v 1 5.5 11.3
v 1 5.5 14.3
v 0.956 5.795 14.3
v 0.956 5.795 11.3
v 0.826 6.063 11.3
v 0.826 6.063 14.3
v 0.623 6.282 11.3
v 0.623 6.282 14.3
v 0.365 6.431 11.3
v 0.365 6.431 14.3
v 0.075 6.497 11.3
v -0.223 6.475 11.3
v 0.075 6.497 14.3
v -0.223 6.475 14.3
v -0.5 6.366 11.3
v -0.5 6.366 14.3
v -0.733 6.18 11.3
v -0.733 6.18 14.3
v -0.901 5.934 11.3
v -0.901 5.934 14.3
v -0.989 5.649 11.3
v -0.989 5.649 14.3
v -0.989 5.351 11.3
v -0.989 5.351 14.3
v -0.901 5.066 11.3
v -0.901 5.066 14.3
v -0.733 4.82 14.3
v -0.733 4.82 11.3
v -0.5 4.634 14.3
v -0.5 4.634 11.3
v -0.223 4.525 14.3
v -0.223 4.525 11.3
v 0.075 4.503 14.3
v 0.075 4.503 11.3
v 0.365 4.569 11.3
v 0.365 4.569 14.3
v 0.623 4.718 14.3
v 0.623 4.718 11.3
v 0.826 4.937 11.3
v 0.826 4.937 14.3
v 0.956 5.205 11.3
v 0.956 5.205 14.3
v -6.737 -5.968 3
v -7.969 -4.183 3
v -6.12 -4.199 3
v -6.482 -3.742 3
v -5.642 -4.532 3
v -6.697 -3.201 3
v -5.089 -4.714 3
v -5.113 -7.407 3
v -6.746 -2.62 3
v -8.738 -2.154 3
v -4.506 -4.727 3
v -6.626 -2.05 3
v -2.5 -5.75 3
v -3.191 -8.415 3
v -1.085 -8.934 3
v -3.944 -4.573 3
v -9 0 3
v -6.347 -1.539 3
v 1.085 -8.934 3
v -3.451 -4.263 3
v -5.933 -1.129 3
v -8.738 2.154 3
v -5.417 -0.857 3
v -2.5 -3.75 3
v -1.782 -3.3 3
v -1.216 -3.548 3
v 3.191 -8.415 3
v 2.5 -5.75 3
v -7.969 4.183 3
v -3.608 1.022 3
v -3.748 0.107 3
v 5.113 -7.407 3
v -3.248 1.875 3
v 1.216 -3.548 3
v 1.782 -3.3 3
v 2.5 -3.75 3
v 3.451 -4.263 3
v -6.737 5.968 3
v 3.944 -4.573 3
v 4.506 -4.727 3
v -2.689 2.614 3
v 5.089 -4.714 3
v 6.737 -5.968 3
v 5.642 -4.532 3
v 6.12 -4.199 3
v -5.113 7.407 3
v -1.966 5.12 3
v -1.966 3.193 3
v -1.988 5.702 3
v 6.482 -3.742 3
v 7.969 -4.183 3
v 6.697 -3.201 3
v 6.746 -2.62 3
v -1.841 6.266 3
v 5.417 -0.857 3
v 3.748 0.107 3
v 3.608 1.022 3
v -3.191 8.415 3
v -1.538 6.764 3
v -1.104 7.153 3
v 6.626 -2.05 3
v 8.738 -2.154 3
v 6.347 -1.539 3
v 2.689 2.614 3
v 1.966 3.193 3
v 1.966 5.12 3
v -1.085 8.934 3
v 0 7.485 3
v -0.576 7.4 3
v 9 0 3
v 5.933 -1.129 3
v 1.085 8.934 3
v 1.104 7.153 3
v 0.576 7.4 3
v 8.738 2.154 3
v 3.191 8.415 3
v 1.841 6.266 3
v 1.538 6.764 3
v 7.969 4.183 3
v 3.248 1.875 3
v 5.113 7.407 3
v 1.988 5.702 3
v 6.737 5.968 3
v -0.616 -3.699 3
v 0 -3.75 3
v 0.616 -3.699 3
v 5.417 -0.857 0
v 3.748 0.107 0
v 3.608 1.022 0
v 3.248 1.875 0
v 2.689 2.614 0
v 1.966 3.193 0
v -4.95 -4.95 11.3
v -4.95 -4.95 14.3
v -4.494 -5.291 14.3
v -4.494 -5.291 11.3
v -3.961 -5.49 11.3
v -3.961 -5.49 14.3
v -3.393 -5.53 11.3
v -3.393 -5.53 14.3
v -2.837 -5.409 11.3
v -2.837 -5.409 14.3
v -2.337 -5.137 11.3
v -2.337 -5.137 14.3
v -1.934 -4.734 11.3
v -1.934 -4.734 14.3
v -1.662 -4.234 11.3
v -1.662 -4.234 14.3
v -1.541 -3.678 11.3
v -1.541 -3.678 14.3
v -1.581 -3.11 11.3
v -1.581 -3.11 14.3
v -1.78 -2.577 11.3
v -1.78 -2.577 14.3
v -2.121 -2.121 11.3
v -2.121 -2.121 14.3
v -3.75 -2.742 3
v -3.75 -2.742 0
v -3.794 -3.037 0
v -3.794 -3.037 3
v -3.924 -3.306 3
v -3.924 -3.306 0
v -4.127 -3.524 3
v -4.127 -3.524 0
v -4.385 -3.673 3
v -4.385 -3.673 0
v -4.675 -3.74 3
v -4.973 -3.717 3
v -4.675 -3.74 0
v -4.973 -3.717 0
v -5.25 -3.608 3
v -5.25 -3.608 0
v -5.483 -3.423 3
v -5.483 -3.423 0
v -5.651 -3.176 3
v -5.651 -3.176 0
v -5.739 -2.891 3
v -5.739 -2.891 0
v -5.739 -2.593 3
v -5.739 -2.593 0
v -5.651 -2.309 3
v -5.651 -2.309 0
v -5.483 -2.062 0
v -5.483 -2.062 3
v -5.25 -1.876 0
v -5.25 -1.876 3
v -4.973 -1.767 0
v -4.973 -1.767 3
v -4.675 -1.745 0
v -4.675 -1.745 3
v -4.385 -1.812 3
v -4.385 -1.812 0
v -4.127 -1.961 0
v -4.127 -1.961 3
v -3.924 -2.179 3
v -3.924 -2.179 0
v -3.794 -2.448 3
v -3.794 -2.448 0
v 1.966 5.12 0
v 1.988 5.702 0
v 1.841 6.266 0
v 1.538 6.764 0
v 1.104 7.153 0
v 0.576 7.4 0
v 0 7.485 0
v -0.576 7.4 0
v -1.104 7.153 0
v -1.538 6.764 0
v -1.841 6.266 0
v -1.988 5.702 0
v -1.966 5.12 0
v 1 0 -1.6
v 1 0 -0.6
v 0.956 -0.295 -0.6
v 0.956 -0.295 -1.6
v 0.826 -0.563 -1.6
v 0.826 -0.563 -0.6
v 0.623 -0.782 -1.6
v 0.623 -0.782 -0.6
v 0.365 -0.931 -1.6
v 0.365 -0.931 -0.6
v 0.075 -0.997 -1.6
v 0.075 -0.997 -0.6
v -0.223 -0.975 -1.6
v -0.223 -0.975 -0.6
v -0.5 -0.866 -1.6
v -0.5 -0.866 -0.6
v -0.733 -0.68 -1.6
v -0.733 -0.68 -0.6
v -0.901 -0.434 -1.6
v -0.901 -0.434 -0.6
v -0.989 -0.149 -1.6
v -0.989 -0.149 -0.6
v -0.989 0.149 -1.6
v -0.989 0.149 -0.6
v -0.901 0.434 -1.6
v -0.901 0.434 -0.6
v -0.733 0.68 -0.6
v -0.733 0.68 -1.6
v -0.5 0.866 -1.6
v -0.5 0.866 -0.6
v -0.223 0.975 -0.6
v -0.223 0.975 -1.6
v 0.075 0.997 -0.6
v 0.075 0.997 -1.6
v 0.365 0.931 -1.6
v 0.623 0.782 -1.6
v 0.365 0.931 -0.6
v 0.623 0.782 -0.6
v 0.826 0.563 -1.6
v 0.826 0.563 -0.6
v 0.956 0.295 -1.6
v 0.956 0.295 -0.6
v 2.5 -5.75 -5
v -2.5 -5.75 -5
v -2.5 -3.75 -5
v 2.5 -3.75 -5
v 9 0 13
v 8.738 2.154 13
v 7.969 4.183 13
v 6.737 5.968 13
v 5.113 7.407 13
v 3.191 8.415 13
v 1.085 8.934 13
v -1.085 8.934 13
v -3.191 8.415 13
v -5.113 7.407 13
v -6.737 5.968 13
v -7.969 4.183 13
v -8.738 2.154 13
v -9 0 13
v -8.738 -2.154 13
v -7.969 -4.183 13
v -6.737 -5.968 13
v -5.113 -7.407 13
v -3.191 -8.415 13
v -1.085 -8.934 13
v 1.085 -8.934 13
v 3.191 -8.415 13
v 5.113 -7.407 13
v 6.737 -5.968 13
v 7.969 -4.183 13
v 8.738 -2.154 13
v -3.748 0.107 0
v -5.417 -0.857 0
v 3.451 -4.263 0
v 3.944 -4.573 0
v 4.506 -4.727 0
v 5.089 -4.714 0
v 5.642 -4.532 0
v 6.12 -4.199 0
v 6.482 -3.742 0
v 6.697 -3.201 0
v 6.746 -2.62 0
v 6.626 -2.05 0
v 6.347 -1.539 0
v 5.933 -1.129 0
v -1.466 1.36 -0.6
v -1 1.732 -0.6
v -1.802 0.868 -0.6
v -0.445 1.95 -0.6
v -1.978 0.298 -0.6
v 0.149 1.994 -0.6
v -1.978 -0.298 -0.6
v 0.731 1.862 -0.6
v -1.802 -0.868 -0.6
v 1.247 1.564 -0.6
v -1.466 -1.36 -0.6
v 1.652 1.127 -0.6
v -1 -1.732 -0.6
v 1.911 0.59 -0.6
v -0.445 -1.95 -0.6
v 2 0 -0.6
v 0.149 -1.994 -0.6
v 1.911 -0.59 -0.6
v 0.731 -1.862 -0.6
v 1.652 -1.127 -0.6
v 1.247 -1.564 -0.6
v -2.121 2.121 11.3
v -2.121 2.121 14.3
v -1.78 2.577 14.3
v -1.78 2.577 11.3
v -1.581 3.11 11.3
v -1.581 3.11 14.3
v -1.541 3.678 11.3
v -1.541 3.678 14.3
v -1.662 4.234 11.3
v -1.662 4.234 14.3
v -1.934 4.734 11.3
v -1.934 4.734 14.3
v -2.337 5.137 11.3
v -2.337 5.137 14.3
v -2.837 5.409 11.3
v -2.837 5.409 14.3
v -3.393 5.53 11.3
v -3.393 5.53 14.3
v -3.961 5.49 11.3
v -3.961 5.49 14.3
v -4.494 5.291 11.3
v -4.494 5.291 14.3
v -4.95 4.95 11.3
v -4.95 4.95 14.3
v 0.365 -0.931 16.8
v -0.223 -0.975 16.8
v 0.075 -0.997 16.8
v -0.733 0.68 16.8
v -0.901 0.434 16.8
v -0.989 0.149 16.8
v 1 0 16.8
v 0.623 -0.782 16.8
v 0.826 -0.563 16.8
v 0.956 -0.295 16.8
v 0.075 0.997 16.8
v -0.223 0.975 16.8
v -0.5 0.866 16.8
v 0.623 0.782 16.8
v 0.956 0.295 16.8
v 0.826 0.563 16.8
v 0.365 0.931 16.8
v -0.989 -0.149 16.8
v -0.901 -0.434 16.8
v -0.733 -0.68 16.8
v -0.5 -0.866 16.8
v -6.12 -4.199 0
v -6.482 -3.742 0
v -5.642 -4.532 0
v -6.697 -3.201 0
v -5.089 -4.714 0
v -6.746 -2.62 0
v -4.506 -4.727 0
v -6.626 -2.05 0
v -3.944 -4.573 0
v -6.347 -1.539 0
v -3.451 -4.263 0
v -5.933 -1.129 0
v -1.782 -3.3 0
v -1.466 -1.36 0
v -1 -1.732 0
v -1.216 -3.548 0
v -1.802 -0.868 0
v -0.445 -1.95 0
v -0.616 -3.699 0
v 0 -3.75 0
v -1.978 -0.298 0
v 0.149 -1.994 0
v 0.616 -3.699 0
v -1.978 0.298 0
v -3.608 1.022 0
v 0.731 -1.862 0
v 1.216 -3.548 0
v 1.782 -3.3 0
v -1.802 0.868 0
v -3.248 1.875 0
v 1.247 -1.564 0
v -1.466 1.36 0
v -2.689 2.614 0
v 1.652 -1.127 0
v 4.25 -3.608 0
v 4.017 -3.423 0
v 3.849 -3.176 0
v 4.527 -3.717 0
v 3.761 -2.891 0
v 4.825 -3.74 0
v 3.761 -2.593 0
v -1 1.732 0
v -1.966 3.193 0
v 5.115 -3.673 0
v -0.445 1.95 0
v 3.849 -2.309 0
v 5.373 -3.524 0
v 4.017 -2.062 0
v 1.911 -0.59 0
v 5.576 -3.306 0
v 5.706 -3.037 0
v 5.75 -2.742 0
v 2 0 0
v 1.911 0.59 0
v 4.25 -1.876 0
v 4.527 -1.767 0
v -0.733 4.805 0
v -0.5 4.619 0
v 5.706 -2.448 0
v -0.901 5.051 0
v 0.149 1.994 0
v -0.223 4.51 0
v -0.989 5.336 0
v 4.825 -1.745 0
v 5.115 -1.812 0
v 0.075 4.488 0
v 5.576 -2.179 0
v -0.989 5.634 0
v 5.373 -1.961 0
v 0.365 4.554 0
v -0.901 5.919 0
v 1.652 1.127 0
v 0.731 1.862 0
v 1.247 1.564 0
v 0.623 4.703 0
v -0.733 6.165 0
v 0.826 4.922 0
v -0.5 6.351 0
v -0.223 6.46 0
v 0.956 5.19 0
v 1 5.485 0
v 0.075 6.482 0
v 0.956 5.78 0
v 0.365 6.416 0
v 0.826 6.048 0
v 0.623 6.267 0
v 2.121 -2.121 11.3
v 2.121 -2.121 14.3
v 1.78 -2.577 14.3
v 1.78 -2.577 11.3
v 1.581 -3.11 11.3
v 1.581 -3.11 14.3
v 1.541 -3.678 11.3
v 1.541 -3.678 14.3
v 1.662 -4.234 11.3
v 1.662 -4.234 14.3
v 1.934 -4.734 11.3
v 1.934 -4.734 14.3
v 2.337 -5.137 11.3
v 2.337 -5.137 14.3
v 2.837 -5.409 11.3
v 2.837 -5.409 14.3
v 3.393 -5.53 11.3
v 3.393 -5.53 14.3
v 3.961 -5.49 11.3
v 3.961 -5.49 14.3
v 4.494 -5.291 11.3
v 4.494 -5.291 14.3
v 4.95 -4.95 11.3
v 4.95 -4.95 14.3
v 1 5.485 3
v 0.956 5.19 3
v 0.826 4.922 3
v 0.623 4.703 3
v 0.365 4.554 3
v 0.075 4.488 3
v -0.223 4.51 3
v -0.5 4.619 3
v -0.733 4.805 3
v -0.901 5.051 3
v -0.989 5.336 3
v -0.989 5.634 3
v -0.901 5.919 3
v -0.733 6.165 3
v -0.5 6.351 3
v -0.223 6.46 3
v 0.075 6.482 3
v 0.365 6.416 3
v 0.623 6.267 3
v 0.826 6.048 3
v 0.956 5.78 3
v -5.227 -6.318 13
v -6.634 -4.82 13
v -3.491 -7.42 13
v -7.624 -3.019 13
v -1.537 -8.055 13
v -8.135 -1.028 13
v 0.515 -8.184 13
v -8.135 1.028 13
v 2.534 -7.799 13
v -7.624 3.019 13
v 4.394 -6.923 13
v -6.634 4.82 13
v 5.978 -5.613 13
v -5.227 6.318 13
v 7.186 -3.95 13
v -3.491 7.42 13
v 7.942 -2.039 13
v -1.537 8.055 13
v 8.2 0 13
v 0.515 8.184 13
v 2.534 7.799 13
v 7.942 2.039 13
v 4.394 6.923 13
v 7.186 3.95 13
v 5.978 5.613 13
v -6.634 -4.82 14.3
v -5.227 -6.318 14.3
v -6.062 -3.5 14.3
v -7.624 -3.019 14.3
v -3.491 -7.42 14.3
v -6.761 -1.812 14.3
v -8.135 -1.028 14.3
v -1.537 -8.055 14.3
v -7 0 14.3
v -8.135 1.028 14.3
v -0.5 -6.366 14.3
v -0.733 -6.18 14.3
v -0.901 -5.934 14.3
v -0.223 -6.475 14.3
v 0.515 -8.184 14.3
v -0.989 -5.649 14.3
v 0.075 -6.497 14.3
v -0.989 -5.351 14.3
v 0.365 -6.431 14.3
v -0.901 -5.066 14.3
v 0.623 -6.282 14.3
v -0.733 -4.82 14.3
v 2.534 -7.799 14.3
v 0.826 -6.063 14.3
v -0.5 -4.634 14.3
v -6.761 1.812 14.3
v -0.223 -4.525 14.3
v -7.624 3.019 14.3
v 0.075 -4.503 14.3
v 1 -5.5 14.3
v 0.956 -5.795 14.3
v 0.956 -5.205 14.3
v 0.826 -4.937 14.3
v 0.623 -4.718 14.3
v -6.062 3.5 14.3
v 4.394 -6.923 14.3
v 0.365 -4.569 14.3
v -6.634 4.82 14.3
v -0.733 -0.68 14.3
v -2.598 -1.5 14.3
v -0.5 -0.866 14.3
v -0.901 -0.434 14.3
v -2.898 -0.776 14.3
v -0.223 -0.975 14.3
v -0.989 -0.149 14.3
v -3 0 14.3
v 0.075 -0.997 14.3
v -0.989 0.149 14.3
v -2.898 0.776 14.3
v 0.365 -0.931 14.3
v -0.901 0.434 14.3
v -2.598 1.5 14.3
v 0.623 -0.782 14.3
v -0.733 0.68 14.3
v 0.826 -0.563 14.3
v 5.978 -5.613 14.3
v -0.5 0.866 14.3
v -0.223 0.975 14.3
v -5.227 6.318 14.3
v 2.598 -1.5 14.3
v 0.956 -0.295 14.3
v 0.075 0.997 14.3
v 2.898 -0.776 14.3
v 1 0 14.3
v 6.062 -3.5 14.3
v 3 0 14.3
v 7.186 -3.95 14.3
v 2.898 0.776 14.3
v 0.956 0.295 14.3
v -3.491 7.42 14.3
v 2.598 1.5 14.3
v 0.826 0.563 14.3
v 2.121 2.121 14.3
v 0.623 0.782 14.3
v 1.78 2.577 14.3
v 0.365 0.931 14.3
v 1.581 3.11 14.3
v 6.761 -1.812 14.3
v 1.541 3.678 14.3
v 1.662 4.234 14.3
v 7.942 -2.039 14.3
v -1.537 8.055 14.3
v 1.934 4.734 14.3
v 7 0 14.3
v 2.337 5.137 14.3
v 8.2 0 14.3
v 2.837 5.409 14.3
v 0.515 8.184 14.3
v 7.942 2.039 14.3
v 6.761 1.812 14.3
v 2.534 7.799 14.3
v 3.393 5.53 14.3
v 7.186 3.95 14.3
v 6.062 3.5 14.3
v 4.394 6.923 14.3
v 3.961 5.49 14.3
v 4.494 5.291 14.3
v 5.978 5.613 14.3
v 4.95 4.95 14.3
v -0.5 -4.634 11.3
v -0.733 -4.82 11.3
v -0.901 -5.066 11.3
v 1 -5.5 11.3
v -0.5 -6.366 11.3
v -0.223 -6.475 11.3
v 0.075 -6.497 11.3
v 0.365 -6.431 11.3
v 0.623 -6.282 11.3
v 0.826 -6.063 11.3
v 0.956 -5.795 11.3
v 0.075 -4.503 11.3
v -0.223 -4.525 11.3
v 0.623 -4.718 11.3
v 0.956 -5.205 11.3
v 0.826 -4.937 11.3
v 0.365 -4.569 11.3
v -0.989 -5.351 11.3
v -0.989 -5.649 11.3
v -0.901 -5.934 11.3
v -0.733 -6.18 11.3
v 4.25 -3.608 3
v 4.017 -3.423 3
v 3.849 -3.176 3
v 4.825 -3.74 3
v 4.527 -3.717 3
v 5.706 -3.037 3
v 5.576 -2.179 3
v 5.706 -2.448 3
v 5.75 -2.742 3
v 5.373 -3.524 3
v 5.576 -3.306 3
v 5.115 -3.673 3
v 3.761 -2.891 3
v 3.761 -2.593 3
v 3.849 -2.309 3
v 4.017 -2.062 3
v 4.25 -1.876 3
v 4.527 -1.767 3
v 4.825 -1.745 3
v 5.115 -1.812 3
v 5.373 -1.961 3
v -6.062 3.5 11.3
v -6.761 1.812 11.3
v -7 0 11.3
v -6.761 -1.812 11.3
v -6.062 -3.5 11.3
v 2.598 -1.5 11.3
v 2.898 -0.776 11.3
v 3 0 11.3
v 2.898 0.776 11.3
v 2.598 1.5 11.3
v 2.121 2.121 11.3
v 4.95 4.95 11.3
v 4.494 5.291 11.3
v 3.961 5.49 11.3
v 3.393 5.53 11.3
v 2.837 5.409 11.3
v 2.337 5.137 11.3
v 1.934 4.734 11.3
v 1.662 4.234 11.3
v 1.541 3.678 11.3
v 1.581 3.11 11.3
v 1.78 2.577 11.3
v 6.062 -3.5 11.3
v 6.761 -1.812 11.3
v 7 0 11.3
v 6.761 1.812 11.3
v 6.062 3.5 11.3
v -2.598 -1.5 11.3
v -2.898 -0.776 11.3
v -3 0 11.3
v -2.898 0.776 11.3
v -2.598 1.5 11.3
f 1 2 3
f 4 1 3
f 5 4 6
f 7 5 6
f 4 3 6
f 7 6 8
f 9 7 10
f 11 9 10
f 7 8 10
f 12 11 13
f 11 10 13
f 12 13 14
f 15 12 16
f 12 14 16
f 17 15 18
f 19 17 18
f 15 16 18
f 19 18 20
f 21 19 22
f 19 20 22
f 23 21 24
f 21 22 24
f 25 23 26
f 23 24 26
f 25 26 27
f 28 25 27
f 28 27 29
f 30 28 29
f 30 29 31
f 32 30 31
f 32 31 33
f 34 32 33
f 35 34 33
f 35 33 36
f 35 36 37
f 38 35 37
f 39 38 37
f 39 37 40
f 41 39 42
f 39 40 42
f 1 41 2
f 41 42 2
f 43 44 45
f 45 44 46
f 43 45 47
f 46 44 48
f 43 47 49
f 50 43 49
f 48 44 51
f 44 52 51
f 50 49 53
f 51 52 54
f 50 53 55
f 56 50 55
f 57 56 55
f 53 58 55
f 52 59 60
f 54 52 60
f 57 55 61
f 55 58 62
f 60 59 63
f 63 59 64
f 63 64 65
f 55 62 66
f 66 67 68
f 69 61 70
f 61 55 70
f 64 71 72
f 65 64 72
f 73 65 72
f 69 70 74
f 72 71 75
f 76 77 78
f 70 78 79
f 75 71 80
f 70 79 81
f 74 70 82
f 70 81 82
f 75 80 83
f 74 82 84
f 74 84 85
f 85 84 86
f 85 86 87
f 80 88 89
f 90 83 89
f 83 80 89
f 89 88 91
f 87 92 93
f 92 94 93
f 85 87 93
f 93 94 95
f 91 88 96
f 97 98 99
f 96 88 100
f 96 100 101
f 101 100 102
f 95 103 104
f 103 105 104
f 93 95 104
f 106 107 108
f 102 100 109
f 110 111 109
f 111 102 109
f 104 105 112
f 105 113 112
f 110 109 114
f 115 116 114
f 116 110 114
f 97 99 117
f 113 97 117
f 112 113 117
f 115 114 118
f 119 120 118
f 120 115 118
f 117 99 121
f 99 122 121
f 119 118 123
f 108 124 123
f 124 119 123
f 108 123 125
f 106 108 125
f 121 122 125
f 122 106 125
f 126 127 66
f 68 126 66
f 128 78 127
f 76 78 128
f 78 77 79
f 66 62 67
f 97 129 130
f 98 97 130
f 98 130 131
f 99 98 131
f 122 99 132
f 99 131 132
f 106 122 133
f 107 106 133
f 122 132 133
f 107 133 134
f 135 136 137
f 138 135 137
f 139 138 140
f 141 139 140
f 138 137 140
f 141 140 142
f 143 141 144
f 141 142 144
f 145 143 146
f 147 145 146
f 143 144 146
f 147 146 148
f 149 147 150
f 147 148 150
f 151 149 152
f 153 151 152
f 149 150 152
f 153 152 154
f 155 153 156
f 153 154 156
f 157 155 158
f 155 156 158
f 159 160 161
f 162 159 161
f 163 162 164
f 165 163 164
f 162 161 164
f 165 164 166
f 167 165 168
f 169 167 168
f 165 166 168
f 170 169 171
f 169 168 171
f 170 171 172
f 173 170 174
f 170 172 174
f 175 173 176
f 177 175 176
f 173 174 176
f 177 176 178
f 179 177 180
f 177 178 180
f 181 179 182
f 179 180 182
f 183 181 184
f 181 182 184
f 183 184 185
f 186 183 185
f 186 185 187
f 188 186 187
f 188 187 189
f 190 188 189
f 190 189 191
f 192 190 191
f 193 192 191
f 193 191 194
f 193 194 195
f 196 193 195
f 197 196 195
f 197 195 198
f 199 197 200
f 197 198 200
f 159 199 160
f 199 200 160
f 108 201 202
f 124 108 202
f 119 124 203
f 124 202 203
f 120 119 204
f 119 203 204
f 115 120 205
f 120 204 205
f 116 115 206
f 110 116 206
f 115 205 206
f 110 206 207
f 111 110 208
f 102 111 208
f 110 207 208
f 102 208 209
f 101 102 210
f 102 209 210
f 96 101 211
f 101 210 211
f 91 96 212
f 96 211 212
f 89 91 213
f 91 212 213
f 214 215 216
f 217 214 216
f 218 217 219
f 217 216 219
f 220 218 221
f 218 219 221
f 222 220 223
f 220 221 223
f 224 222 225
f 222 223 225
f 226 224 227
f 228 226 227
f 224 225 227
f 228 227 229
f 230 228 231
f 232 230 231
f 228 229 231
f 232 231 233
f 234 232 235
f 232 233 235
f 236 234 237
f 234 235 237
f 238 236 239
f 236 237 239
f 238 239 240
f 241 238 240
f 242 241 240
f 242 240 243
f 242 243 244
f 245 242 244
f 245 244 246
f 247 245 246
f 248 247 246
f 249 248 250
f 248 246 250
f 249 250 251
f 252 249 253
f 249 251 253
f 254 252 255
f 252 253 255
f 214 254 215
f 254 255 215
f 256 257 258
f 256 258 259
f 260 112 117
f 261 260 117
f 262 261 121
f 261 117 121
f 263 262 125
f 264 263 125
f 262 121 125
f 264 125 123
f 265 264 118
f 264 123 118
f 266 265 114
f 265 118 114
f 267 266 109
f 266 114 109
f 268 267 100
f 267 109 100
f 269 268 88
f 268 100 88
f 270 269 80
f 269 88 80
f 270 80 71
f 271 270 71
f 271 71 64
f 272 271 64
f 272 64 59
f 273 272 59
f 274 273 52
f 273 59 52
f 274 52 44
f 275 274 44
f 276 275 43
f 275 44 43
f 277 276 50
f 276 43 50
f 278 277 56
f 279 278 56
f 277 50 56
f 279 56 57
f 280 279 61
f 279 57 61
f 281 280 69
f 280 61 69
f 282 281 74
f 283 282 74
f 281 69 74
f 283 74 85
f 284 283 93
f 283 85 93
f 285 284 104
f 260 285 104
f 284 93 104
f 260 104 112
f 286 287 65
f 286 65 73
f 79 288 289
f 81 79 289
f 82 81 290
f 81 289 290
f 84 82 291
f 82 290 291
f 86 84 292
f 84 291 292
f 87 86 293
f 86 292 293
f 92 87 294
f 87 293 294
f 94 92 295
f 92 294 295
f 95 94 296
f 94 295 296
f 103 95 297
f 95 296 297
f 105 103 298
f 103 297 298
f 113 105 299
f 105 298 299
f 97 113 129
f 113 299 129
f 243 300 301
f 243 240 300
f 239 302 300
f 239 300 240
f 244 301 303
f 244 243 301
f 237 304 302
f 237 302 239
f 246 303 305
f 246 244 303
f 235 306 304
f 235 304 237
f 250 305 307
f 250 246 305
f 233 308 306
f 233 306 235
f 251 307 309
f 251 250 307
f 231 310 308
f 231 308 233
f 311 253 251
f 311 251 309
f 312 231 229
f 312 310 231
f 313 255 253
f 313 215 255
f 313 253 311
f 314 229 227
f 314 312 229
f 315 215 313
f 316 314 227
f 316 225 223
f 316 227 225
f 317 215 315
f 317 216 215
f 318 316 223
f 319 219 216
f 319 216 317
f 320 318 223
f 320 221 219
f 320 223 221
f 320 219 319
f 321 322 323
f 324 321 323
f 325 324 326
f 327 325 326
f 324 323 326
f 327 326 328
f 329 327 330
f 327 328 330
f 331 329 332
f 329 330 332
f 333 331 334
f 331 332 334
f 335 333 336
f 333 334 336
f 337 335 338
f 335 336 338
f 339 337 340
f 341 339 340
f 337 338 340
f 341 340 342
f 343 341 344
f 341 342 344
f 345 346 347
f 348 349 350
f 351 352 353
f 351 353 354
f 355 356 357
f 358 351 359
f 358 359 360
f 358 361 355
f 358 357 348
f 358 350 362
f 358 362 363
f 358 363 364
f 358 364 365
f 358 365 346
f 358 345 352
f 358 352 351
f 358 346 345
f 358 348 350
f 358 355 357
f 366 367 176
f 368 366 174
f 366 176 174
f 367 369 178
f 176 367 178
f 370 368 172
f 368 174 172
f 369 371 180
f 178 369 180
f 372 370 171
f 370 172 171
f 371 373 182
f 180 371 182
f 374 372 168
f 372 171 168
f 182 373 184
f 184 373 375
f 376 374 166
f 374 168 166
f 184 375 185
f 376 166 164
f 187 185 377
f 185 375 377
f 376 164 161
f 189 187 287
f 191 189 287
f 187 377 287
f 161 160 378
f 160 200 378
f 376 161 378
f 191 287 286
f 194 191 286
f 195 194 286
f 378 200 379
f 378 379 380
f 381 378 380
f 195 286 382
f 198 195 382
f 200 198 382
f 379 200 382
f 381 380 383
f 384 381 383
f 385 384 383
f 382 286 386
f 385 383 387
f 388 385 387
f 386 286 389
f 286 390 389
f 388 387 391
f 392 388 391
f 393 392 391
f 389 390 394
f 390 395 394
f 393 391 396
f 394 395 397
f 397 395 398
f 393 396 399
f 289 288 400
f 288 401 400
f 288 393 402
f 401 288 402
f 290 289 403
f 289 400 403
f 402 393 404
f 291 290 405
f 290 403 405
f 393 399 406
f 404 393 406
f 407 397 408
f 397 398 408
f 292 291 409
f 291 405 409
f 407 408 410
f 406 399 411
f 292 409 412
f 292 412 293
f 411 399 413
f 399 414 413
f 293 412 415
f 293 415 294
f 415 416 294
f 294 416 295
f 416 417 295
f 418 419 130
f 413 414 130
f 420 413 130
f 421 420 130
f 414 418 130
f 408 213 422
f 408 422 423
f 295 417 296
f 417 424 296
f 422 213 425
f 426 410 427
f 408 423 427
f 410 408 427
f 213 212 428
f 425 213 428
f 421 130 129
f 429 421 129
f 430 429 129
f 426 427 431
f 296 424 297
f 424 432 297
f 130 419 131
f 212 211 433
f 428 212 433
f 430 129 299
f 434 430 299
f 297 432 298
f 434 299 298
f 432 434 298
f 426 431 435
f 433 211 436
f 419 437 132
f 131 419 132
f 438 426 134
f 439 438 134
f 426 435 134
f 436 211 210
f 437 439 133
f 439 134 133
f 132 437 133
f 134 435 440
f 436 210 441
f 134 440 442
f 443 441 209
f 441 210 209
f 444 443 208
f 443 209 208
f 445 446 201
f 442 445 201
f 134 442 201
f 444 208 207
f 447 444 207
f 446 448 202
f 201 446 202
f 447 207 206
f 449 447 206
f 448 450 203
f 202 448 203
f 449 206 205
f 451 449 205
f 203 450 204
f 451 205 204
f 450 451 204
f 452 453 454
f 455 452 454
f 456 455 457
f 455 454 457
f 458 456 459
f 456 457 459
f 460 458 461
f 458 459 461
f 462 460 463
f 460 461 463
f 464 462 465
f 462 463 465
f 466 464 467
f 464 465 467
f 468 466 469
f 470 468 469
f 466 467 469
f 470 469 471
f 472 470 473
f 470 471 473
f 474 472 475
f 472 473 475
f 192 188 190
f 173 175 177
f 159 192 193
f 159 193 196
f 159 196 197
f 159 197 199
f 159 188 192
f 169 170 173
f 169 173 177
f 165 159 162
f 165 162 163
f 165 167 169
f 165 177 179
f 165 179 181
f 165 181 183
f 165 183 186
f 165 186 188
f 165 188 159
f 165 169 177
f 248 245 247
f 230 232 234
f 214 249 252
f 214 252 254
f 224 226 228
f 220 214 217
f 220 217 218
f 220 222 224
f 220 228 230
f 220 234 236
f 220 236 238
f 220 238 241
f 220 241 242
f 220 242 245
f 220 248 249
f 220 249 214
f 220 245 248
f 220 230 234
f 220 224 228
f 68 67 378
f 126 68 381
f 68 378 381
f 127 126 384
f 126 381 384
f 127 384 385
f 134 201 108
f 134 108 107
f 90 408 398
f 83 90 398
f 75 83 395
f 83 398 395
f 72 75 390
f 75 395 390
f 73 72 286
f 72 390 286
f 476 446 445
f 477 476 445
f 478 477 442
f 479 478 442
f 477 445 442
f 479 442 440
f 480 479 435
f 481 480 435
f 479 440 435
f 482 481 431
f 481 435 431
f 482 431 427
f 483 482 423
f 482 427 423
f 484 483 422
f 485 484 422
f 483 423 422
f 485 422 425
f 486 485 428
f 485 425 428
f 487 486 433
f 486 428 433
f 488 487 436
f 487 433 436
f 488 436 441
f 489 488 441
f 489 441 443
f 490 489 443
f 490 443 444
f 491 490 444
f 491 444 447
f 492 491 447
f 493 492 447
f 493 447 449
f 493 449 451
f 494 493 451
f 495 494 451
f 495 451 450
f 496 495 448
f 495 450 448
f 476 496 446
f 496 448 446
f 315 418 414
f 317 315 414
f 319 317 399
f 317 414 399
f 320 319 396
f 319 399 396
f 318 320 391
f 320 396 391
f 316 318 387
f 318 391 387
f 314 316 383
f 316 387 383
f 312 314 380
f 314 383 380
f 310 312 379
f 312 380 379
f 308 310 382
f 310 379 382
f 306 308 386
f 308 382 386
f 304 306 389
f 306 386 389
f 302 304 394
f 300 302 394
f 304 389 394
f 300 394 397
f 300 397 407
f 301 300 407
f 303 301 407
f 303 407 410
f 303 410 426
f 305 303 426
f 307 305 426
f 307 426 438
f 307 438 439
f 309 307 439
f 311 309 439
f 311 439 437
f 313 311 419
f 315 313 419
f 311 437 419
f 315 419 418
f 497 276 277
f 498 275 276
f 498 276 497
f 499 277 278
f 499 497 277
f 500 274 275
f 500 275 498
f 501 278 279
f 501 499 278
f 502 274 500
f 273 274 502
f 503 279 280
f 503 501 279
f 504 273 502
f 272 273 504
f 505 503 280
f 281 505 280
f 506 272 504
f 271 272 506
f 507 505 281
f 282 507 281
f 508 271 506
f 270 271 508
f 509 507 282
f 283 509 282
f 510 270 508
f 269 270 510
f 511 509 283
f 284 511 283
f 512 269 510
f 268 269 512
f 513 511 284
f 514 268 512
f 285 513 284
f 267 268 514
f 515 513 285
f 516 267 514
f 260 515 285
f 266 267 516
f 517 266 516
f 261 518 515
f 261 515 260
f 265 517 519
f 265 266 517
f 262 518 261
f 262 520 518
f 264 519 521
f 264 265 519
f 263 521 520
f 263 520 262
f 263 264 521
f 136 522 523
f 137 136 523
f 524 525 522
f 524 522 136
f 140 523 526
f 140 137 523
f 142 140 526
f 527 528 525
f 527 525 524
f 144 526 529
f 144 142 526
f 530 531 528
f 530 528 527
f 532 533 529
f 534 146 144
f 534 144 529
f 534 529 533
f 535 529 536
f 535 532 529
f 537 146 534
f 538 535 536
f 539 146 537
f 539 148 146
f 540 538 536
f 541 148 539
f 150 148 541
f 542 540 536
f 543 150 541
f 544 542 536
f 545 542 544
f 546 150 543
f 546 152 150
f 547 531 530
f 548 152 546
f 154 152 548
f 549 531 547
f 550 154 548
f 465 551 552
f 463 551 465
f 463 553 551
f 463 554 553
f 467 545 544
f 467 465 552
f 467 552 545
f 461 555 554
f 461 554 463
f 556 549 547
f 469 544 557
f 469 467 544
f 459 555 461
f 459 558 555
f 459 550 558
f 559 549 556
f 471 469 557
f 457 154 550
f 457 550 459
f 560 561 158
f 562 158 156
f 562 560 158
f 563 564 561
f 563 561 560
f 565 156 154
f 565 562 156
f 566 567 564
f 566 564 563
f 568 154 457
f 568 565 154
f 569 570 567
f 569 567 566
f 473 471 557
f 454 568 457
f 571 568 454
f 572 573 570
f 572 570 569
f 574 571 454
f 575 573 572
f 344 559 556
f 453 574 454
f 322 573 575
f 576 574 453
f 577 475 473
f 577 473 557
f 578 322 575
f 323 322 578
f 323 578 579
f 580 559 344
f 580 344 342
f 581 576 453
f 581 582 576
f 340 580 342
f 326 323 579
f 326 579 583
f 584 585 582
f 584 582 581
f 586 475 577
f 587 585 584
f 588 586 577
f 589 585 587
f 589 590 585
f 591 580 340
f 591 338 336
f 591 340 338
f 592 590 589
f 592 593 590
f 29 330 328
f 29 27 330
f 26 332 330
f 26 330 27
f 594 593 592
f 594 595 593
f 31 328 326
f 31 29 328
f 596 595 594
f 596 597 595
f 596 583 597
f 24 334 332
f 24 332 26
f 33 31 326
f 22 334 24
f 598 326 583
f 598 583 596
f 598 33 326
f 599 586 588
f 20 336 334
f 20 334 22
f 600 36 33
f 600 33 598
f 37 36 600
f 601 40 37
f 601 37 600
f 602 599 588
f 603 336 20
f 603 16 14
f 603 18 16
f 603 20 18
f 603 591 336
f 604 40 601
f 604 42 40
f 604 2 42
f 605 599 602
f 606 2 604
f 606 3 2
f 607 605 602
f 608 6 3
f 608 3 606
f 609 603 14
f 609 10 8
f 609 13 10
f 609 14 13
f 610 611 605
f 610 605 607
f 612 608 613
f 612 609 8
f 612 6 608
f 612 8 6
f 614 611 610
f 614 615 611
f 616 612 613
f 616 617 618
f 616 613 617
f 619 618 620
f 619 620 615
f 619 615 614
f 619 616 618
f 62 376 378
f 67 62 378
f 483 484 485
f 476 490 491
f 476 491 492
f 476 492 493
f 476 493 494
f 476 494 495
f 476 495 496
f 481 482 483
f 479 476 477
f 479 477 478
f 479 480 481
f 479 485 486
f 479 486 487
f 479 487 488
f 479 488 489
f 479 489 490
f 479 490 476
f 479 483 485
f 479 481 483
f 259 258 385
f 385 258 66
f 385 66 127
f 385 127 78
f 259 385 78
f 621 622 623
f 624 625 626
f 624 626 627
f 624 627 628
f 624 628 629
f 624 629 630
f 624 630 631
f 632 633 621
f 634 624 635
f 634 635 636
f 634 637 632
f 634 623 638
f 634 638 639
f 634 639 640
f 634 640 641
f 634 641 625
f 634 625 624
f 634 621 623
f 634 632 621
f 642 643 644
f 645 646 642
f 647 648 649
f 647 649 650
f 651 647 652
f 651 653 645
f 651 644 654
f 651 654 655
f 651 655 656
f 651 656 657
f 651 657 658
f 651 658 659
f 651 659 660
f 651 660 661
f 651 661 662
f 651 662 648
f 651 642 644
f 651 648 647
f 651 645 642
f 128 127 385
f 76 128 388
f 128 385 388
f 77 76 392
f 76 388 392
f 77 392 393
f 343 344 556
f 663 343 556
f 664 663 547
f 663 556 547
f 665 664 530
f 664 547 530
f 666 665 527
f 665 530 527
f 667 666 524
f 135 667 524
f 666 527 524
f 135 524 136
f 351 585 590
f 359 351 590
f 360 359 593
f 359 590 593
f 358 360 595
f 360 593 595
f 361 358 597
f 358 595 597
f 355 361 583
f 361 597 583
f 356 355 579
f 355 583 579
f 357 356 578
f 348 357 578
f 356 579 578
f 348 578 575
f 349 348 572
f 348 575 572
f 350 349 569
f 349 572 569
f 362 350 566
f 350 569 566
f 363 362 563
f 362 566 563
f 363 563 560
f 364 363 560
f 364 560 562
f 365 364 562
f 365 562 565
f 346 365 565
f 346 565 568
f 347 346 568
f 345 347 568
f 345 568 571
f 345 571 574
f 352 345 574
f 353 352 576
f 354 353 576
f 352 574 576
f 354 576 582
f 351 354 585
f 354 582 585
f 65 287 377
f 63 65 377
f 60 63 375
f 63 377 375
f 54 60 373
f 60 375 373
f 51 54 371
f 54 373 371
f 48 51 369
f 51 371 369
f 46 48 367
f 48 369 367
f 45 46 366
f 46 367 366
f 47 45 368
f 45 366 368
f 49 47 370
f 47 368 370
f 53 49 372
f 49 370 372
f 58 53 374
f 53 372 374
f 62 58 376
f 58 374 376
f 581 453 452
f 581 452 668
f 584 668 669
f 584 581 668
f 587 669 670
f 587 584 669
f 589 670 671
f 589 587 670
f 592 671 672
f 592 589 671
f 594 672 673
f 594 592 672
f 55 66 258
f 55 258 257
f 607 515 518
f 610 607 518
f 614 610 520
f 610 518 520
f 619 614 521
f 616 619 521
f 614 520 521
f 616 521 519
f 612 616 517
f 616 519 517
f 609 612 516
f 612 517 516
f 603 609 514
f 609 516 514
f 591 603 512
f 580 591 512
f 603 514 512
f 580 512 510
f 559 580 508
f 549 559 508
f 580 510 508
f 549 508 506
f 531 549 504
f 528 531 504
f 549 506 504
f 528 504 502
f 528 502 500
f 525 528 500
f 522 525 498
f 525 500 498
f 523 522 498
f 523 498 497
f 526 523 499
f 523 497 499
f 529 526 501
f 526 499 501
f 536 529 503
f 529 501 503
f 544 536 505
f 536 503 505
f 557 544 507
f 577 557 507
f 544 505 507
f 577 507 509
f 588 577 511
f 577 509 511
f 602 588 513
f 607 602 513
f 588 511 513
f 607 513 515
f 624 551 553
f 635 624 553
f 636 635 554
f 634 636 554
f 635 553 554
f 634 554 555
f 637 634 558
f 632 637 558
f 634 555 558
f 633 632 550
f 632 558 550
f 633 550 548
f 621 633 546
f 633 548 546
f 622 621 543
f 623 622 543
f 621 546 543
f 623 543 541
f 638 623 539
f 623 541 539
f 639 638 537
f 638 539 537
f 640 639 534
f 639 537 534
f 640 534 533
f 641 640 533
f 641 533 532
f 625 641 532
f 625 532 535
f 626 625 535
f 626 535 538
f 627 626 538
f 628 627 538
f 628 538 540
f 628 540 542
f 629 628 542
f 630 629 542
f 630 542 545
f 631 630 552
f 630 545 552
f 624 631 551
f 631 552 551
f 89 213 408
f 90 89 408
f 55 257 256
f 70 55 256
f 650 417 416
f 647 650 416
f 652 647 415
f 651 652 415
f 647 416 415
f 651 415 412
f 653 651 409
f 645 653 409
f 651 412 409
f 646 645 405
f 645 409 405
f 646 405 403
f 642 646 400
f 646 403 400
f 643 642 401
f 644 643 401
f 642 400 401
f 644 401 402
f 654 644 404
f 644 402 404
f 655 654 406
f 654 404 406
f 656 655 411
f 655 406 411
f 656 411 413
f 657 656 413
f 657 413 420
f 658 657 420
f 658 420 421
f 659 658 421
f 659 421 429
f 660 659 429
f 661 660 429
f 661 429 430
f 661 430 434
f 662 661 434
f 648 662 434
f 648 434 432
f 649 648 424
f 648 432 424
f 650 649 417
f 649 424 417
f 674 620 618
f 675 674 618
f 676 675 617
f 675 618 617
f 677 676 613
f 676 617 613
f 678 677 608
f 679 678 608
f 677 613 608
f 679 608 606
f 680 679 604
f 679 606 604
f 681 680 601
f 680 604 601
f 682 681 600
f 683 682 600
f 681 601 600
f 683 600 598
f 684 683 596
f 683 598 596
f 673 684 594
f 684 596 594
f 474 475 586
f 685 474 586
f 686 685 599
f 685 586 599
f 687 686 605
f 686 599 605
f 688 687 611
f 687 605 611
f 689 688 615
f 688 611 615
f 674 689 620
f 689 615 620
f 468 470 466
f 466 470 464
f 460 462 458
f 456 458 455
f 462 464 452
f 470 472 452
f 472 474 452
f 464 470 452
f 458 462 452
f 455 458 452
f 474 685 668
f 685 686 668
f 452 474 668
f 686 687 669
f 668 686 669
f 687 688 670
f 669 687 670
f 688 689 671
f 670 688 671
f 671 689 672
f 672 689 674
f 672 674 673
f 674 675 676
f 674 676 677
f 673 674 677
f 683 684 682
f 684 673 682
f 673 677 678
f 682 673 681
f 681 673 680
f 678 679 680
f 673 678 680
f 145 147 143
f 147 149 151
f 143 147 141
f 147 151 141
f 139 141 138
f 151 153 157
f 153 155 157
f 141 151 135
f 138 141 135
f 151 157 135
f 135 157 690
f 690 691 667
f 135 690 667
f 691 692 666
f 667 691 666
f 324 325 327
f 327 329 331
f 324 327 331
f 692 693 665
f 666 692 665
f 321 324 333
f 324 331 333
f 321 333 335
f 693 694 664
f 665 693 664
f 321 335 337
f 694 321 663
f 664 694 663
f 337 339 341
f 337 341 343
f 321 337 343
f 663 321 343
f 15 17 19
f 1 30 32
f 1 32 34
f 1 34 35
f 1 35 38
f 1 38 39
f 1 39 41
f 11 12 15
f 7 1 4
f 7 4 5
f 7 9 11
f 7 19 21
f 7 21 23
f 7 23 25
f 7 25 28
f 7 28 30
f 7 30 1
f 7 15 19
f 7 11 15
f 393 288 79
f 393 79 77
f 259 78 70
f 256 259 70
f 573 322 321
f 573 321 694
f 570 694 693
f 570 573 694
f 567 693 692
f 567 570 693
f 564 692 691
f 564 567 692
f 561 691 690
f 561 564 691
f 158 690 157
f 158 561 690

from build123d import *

# Parameters (mm, degrees)
PAD_DEPTH       = 3
SKETCH001_R     = 9
PAD001_DEPTH    = 10
SKETCH002_R     = 8.2
PAD002_DEPTH    = 1.3
SKETCH003_R     = 1
PAD003_DEPTH    = 2.5
SKETCH004_R     = 1
POCKET_DEPTH    = 3
SKETCH005_R     = 1
POCKET001_DEPTH = 3
SKETCH006_R     = 2
PAD004_DEPTH    = 0.6
SKETCH007_R     = 1
PAD005_DEPTH    = 1
SKETCH008_W     = 5
SKETCH008_H     = 2
PAD006_DEPTH    = 8


with BuildPart() as part:
    # Sketch → Pad (new body)
    with BuildSketch(Plane.XY):
        with BuildLine():
            ThreePointArc((3.450971, -4.263113), (6.482051, -3.742414), (5.41745, -0.857073))
            Line((5.41745, -0.857073), (3.748487, 0.106503))
            ThreePointArc((3.748487, 0.106503), (3.247595, 1.875), (1.966478, 3.193034))
            Line((1.966478, 5.120185), (1.966478, 3.193034))
            ThreePointArc((1.966478, 5.120185), (0, 7.484828), (-1.966478, 5.120185))
            Line((-1.966478, 5.120185), (-1.966478, 3.193034))
            ThreePointArc((-1.966478, 3.193034), (-3.247595, 1.875), (-3.748487, 0.106503))
            Line((-5.41745, -0.857073), (-3.748487, 0.106503))
            ThreePointArc((-5.41745, -0.857073), (-6.482051, -3.742414), (-3.450971, -4.263113))
            Line((-3.450971, -4.263113), (-1.782009, -3.299537))
            ThreePointArc((-1.782009, -3.299537), (0, -3.75), (1.782009, -3.299537))
            Line((3.450971, -4.263113), (1.782009, -3.299537))
        make_face()
    extrude(amount=PAD_DEPTH)

    # Sketch001 (on Face14 of Pad) → Pad001 (join)
    with BuildSketch(Plane.XY.offset(3)):
        Circle(SKETCH001_R)
    extrude(amount=PAD001_DEPTH)

    # Sketch002 (on Face3 of Pad001) → Pad002 (join)
    with BuildSketch(Plane.XY.offset(13)):
        Circle(SKETCH002_R)
    extrude(amount=PAD002_DEPTH)

    # Sketch003 (on Face18 of Pad002) → Pad003 (join)
    with BuildSketch(Plane.XY.offset(14.3)):
        Circle(SKETCH003_R)
    extrude(amount=PAD003_DEPTH)

    # Sketch004 (on Face17 of Pad003) → Pocket (cut)
    with BuildSketch(Plane(origin=(0, 0, 0), x_dir=(1, 0, 0), z_dir=(0, 0, -1))):
        with Locations((4.75, 2.742414)):
            Circle(SKETCH004_R)
        with Locations((-4.75, 2.742414)):
            Circle(SKETCH004_R)
        with Locations((0, -5.484828)):
            Circle(SKETCH004_R)
    extrude(amount=-POCKET_DEPTH, mode=Mode.SUBTRACT)

    # Sketch005 (on Face18 of Pocket) → Pocket001 (cut)
    with BuildSketch(Plane.XY.offset(14.3)):
        with Locations((0, 5.5)):
            Circle(SKETCH005_R)
        with Locations((0, -5.5)):
            Circle(SKETCH005_R)
        with BuildLine():
            ThreePointArc((-2.12132, 2.12132), (-3, 0), (-2.12132, -2.12132))
            ThreePointArc((-4.949764, -4.949731), (-2.121328, -4.949756), (-2.12132, -2.12132))
            ThreePointArc((-4.949748, 4.949747), (-7, 1.1e-05), (-4.949764, -4.949731))
            ThreePointArc((-2.12132, 2.12132), (-2.12132, 4.949747), (-4.949748, 4.949747))
        make_face()
        with BuildLine():
            ThreePointArc((2.12132, -2.12132), (3, 0), (2.12132, 2.12132))
            ThreePointArc((4.949748, 4.949747), (2.12132, 4.949748), (2.12132, 2.12132))
            ThreePointArc((4.949747, -4.949748), (7, 0), (4.949748, 4.949747))
            ThreePointArc((2.12132, -2.12132), (2.12132, -4.949747), (4.949747, -4.949748))
        make_face()
    extrude(amount=-POCKET001_DEPTH, mode=Mode.SUBTRACT)

    # Sketch006 (on Face17 of Pocket001) → Pad004 (join)
    with BuildSketch(Plane(origin=(0, 0, 0), x_dir=(1, 0, 0), z_dir=(0, 0, -1))):
        Circle(SKETCH006_R)
    extrude(amount=PAD004_DEPTH)

    # Sketch007 (on Face36 of Pad004) → Pad005 (join)
    with BuildSketch(Plane(origin=(0, 0, -0.6), x_dir=(1, 0, 0), z_dir=(0, 0, -1))):
        Circle(SKETCH007_R)
    extrude(amount=PAD005_DEPTH)

    # Sketch008 (on Face2 of Pad005) → Pad006 (join)
    with BuildSketch(Plane(origin=(0, 0, 3), x_dir=(1, 0, 0), z_dir=(0, 0, -1))):
        with Locations((0, 4.75)):
            Rectangle(SKETCH008_W, SKETCH008_H)
    extrude(amount=PAD006_DEPTH)


solid = part.part
